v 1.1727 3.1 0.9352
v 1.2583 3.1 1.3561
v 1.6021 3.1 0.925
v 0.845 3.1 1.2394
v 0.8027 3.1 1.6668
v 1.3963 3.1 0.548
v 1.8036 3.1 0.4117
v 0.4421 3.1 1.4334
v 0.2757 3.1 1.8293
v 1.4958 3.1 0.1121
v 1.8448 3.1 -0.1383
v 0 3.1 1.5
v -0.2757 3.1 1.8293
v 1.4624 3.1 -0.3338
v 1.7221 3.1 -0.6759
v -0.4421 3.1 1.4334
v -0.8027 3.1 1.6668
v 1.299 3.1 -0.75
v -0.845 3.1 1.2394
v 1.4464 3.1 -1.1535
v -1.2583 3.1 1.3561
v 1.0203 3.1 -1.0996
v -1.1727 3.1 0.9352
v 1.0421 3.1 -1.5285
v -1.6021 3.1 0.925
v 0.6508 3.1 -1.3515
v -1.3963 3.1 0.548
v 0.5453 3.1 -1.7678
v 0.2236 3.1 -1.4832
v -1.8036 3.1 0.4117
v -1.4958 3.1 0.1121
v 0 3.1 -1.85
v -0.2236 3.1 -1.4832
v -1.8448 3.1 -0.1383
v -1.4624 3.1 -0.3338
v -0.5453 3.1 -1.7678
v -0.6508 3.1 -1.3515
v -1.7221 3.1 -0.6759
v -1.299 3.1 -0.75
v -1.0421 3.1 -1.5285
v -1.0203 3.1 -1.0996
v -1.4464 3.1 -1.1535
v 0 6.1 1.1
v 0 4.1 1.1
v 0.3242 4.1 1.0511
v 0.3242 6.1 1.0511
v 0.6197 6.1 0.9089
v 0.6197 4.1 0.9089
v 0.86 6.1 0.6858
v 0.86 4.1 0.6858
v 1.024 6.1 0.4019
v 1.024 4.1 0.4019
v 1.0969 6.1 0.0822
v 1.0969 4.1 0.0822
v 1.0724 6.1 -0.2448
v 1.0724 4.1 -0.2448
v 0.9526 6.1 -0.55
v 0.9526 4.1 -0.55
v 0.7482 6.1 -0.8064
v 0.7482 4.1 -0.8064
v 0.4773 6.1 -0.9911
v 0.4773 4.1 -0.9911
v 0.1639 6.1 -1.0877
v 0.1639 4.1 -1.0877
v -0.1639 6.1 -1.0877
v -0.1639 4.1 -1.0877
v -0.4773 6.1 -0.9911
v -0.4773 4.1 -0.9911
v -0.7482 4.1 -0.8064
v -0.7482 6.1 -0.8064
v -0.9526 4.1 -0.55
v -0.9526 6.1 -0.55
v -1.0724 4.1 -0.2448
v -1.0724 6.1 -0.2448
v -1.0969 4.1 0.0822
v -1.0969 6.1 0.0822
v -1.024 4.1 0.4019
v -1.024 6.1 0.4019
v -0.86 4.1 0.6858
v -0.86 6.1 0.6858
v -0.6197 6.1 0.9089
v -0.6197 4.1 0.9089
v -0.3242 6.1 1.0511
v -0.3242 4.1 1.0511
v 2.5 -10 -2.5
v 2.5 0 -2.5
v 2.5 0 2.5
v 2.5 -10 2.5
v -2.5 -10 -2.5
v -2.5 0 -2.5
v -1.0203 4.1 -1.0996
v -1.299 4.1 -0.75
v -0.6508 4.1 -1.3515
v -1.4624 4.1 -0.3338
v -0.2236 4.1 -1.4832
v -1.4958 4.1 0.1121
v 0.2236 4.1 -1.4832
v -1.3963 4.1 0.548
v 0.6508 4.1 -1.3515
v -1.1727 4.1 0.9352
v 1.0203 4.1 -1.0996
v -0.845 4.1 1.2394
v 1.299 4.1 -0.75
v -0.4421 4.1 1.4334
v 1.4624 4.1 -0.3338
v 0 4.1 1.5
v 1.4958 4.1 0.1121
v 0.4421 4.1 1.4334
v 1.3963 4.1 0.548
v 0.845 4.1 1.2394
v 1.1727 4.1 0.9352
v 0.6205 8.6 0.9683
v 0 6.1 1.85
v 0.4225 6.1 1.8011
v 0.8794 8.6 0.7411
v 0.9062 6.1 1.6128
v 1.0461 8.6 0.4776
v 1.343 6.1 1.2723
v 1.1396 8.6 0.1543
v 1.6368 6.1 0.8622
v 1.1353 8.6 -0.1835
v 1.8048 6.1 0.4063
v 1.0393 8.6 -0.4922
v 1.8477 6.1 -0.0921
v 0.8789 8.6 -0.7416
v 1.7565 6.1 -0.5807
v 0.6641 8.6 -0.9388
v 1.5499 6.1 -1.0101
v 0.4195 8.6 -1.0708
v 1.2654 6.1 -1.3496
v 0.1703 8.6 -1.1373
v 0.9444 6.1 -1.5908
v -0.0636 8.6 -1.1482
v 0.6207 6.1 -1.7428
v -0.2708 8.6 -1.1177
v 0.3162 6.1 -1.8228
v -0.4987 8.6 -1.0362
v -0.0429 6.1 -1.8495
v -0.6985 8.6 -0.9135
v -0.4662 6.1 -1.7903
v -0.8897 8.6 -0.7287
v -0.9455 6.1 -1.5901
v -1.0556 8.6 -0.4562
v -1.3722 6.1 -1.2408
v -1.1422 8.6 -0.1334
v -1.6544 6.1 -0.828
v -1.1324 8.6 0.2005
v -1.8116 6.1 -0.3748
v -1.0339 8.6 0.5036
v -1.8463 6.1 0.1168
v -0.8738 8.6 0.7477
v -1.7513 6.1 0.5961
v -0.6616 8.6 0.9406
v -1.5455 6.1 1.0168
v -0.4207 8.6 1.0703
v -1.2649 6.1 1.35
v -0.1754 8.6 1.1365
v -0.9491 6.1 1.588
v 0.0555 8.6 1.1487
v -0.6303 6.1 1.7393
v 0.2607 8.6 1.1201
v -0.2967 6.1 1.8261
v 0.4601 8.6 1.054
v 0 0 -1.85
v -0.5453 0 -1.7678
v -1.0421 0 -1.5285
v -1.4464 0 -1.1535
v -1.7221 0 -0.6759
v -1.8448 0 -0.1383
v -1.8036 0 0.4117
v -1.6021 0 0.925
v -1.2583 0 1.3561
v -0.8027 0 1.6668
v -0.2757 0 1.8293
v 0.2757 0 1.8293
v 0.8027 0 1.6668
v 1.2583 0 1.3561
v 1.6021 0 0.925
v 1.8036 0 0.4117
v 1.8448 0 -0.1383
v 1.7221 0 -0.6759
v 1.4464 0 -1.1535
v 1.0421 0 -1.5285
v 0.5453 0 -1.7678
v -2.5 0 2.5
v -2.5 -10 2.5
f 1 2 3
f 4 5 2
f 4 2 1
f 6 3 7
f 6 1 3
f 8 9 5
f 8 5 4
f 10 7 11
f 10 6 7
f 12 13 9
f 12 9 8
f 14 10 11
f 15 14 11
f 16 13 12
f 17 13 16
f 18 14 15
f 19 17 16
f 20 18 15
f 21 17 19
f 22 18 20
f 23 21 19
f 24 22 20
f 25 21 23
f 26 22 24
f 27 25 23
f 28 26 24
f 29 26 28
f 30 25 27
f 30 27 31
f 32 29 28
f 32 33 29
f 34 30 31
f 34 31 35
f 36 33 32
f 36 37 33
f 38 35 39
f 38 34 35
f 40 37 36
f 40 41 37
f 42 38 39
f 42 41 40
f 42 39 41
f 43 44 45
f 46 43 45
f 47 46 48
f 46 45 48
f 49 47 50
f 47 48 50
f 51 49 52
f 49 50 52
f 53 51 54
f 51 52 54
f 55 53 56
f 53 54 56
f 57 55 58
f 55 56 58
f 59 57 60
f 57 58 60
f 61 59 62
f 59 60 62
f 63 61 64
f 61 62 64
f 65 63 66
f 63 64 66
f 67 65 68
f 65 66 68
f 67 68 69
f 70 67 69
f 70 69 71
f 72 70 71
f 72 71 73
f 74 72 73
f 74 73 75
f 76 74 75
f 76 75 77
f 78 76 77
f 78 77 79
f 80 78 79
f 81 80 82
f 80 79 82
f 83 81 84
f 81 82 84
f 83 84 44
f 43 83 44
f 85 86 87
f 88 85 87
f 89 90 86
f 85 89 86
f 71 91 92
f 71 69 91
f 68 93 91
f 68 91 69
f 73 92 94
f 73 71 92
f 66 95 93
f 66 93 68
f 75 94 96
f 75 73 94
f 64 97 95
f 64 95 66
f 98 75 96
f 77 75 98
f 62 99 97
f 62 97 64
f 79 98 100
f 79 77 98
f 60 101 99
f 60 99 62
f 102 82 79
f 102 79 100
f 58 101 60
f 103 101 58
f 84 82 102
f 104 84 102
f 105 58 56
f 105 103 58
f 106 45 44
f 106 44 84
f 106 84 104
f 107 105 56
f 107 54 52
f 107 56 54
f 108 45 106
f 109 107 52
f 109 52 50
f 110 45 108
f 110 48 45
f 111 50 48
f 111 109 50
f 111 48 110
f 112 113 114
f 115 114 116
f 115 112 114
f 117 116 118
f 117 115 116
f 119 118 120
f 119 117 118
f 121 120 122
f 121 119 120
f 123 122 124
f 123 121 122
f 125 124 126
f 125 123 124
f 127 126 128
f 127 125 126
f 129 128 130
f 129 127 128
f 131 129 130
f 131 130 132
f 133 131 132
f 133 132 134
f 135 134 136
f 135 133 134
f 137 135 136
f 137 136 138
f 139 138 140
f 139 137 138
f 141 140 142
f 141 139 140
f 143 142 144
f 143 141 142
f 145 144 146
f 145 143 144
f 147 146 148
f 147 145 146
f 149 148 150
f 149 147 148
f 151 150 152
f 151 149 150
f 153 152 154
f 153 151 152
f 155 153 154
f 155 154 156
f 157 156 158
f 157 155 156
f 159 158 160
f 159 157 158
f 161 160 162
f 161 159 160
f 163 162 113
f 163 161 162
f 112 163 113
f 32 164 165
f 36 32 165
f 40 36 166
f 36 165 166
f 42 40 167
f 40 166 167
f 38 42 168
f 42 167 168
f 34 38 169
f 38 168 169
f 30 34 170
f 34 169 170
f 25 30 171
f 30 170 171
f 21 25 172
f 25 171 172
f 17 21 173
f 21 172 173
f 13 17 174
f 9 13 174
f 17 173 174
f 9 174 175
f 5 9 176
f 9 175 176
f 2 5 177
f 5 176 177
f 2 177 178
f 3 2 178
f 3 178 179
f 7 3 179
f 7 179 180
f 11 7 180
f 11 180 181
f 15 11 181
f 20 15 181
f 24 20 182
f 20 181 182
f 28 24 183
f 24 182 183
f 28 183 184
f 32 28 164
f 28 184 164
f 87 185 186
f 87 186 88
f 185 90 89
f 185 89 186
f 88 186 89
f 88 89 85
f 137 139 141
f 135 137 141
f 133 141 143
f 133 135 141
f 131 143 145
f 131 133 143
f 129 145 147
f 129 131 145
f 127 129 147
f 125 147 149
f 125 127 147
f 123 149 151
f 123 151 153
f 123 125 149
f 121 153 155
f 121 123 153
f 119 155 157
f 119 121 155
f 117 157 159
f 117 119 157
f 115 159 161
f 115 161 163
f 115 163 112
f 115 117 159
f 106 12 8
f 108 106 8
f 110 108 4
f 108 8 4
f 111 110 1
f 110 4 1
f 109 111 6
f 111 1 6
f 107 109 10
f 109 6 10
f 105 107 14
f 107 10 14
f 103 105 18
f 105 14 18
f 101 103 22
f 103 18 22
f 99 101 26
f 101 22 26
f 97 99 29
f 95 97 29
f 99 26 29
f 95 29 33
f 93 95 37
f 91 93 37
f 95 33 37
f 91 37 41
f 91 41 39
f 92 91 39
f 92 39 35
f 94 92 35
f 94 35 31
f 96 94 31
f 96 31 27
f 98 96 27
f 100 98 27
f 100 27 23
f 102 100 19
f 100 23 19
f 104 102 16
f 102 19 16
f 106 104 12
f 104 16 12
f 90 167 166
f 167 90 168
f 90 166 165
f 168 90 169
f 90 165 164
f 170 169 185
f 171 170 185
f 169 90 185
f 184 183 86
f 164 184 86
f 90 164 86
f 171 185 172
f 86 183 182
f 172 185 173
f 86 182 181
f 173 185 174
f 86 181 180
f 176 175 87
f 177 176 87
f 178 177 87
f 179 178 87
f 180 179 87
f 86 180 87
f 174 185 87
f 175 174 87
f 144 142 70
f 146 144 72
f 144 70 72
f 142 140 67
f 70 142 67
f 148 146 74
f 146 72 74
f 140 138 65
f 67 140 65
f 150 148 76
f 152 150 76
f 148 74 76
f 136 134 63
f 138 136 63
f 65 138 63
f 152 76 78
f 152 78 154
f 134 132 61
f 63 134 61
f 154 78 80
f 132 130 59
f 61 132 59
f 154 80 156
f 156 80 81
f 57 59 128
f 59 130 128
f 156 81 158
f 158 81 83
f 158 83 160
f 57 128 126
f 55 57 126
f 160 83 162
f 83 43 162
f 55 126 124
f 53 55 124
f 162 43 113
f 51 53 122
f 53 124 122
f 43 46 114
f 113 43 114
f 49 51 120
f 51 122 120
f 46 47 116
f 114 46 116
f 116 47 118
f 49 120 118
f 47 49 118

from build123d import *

# Parameters (mm, degrees)
SKETCH1_R           = 1.85
BOSS_EXTRUDE1_DEPTH = 3.1
SKETCH2_R           = 1.5
BOSS_EXTRUDE2_DEPTH = 1
SKETCH3_R           = 1.1
BOSS_EXTRUDE3_DEPTH = 2
SKETCH6_W           = 5
SKETCH6_H           = 5
BOSS_EXTRUDE4_DEPTH = 10


with BuildPart() as part:
    # Sketch1 → Boss-Extrude1 (new body)
    with BuildSketch(Plane(origin=(0, 0, 0), x_dir=(1, 0, 0), z_dir=(0, 1, 0))):
        with Locations(Location((0, 0, 0), (0, 0, 90))):
            Circle(SKETCH1_R)
    extrude(amount=BOSS_EXTRUDE1_DEPTH)

    # Sketch2 → Boss-Extrude2 (add)
    with BuildSketch(Plane(origin=(0, 3.1, 0), x_dir=(1, 0, 0), z_dir=(0, 1, 0))):
        with Locations(Location((0, 0, 0), (0, 0, 270))):
            Circle(SKETCH2_R)
    extrude(amount=BOSS_EXTRUDE2_DEPTH)

    # Sketch3 → Boss-Extrude3 (add)
    with BuildSketch(Plane(origin=(0, 4.1, 0), x_dir=(1, 0, 0), z_dir=(0, 1, 0))):
        with Locations(Location((0, 0, 0), (0, 0, 270))):
            Circle(SKETCH3_R)
    extrude(amount=BOSS_EXTRUDE3_DEPTH)

    # Loft1: read off the stored shape, not the designer's step
    # Loft1: loft between two sections, ruled curve by curve
    loft1_from = [
        Edge.make_bspline([(0, 6.1, 1.85), (3.7, 6.1, 1.85), (3.7, 6.1, -1.85), (0, 6.1, -1.85), (-3.7, 6.1, -1.85), (-3.7, 6.1, 1.85), (0, 6.1, 1.85)], [0, 0, 0, 0, 0.5, 0.5, 0.5, 1, 1, 1, 1], 3, [1, 0.333333333, 0.333333333, 1, 0.333333333, 0.333333333, 1]),
    ]
    loft1_to = [
        Edge.make_bspline([(0.620465421, 8.6, 0.968257539), (2.556980499, 8.6, -0.272673303), (1.316049657, 8.6, -2.209188381), (-0.620465421, 8.6, -0.968257539), (-2.556980499, 8.6, 0.272673303), (-1.316049657, 8.6, 2.209188381), (0.620465421, 8.6, 0.968257539)], [0, 0, 0, 0, 0.5, 0.5, 0.5, 1, 1, 1, 1], 3, [1, 0.333333333, 0.333333333, 1, 0.333333333, 0.333333333, 1]),
    ]
    loft1 = Solid(Shell([*[Face.make_surface_from_curves(loft1_from[k], loft1_to[k]) for k in range(1)], Face(Wire(loft1_from)), Face(Wire(loft1_to))]))
    add(loft1)

    # Sketch6 → Boss-Extrude4 (add)
    with BuildSketch(Plane.XZ):
        Rectangle(SKETCH6_W, SKETCH6_H)
    extrude(amount=BOSS_EXTRUDE4_DEPTH)


solid = part.part
